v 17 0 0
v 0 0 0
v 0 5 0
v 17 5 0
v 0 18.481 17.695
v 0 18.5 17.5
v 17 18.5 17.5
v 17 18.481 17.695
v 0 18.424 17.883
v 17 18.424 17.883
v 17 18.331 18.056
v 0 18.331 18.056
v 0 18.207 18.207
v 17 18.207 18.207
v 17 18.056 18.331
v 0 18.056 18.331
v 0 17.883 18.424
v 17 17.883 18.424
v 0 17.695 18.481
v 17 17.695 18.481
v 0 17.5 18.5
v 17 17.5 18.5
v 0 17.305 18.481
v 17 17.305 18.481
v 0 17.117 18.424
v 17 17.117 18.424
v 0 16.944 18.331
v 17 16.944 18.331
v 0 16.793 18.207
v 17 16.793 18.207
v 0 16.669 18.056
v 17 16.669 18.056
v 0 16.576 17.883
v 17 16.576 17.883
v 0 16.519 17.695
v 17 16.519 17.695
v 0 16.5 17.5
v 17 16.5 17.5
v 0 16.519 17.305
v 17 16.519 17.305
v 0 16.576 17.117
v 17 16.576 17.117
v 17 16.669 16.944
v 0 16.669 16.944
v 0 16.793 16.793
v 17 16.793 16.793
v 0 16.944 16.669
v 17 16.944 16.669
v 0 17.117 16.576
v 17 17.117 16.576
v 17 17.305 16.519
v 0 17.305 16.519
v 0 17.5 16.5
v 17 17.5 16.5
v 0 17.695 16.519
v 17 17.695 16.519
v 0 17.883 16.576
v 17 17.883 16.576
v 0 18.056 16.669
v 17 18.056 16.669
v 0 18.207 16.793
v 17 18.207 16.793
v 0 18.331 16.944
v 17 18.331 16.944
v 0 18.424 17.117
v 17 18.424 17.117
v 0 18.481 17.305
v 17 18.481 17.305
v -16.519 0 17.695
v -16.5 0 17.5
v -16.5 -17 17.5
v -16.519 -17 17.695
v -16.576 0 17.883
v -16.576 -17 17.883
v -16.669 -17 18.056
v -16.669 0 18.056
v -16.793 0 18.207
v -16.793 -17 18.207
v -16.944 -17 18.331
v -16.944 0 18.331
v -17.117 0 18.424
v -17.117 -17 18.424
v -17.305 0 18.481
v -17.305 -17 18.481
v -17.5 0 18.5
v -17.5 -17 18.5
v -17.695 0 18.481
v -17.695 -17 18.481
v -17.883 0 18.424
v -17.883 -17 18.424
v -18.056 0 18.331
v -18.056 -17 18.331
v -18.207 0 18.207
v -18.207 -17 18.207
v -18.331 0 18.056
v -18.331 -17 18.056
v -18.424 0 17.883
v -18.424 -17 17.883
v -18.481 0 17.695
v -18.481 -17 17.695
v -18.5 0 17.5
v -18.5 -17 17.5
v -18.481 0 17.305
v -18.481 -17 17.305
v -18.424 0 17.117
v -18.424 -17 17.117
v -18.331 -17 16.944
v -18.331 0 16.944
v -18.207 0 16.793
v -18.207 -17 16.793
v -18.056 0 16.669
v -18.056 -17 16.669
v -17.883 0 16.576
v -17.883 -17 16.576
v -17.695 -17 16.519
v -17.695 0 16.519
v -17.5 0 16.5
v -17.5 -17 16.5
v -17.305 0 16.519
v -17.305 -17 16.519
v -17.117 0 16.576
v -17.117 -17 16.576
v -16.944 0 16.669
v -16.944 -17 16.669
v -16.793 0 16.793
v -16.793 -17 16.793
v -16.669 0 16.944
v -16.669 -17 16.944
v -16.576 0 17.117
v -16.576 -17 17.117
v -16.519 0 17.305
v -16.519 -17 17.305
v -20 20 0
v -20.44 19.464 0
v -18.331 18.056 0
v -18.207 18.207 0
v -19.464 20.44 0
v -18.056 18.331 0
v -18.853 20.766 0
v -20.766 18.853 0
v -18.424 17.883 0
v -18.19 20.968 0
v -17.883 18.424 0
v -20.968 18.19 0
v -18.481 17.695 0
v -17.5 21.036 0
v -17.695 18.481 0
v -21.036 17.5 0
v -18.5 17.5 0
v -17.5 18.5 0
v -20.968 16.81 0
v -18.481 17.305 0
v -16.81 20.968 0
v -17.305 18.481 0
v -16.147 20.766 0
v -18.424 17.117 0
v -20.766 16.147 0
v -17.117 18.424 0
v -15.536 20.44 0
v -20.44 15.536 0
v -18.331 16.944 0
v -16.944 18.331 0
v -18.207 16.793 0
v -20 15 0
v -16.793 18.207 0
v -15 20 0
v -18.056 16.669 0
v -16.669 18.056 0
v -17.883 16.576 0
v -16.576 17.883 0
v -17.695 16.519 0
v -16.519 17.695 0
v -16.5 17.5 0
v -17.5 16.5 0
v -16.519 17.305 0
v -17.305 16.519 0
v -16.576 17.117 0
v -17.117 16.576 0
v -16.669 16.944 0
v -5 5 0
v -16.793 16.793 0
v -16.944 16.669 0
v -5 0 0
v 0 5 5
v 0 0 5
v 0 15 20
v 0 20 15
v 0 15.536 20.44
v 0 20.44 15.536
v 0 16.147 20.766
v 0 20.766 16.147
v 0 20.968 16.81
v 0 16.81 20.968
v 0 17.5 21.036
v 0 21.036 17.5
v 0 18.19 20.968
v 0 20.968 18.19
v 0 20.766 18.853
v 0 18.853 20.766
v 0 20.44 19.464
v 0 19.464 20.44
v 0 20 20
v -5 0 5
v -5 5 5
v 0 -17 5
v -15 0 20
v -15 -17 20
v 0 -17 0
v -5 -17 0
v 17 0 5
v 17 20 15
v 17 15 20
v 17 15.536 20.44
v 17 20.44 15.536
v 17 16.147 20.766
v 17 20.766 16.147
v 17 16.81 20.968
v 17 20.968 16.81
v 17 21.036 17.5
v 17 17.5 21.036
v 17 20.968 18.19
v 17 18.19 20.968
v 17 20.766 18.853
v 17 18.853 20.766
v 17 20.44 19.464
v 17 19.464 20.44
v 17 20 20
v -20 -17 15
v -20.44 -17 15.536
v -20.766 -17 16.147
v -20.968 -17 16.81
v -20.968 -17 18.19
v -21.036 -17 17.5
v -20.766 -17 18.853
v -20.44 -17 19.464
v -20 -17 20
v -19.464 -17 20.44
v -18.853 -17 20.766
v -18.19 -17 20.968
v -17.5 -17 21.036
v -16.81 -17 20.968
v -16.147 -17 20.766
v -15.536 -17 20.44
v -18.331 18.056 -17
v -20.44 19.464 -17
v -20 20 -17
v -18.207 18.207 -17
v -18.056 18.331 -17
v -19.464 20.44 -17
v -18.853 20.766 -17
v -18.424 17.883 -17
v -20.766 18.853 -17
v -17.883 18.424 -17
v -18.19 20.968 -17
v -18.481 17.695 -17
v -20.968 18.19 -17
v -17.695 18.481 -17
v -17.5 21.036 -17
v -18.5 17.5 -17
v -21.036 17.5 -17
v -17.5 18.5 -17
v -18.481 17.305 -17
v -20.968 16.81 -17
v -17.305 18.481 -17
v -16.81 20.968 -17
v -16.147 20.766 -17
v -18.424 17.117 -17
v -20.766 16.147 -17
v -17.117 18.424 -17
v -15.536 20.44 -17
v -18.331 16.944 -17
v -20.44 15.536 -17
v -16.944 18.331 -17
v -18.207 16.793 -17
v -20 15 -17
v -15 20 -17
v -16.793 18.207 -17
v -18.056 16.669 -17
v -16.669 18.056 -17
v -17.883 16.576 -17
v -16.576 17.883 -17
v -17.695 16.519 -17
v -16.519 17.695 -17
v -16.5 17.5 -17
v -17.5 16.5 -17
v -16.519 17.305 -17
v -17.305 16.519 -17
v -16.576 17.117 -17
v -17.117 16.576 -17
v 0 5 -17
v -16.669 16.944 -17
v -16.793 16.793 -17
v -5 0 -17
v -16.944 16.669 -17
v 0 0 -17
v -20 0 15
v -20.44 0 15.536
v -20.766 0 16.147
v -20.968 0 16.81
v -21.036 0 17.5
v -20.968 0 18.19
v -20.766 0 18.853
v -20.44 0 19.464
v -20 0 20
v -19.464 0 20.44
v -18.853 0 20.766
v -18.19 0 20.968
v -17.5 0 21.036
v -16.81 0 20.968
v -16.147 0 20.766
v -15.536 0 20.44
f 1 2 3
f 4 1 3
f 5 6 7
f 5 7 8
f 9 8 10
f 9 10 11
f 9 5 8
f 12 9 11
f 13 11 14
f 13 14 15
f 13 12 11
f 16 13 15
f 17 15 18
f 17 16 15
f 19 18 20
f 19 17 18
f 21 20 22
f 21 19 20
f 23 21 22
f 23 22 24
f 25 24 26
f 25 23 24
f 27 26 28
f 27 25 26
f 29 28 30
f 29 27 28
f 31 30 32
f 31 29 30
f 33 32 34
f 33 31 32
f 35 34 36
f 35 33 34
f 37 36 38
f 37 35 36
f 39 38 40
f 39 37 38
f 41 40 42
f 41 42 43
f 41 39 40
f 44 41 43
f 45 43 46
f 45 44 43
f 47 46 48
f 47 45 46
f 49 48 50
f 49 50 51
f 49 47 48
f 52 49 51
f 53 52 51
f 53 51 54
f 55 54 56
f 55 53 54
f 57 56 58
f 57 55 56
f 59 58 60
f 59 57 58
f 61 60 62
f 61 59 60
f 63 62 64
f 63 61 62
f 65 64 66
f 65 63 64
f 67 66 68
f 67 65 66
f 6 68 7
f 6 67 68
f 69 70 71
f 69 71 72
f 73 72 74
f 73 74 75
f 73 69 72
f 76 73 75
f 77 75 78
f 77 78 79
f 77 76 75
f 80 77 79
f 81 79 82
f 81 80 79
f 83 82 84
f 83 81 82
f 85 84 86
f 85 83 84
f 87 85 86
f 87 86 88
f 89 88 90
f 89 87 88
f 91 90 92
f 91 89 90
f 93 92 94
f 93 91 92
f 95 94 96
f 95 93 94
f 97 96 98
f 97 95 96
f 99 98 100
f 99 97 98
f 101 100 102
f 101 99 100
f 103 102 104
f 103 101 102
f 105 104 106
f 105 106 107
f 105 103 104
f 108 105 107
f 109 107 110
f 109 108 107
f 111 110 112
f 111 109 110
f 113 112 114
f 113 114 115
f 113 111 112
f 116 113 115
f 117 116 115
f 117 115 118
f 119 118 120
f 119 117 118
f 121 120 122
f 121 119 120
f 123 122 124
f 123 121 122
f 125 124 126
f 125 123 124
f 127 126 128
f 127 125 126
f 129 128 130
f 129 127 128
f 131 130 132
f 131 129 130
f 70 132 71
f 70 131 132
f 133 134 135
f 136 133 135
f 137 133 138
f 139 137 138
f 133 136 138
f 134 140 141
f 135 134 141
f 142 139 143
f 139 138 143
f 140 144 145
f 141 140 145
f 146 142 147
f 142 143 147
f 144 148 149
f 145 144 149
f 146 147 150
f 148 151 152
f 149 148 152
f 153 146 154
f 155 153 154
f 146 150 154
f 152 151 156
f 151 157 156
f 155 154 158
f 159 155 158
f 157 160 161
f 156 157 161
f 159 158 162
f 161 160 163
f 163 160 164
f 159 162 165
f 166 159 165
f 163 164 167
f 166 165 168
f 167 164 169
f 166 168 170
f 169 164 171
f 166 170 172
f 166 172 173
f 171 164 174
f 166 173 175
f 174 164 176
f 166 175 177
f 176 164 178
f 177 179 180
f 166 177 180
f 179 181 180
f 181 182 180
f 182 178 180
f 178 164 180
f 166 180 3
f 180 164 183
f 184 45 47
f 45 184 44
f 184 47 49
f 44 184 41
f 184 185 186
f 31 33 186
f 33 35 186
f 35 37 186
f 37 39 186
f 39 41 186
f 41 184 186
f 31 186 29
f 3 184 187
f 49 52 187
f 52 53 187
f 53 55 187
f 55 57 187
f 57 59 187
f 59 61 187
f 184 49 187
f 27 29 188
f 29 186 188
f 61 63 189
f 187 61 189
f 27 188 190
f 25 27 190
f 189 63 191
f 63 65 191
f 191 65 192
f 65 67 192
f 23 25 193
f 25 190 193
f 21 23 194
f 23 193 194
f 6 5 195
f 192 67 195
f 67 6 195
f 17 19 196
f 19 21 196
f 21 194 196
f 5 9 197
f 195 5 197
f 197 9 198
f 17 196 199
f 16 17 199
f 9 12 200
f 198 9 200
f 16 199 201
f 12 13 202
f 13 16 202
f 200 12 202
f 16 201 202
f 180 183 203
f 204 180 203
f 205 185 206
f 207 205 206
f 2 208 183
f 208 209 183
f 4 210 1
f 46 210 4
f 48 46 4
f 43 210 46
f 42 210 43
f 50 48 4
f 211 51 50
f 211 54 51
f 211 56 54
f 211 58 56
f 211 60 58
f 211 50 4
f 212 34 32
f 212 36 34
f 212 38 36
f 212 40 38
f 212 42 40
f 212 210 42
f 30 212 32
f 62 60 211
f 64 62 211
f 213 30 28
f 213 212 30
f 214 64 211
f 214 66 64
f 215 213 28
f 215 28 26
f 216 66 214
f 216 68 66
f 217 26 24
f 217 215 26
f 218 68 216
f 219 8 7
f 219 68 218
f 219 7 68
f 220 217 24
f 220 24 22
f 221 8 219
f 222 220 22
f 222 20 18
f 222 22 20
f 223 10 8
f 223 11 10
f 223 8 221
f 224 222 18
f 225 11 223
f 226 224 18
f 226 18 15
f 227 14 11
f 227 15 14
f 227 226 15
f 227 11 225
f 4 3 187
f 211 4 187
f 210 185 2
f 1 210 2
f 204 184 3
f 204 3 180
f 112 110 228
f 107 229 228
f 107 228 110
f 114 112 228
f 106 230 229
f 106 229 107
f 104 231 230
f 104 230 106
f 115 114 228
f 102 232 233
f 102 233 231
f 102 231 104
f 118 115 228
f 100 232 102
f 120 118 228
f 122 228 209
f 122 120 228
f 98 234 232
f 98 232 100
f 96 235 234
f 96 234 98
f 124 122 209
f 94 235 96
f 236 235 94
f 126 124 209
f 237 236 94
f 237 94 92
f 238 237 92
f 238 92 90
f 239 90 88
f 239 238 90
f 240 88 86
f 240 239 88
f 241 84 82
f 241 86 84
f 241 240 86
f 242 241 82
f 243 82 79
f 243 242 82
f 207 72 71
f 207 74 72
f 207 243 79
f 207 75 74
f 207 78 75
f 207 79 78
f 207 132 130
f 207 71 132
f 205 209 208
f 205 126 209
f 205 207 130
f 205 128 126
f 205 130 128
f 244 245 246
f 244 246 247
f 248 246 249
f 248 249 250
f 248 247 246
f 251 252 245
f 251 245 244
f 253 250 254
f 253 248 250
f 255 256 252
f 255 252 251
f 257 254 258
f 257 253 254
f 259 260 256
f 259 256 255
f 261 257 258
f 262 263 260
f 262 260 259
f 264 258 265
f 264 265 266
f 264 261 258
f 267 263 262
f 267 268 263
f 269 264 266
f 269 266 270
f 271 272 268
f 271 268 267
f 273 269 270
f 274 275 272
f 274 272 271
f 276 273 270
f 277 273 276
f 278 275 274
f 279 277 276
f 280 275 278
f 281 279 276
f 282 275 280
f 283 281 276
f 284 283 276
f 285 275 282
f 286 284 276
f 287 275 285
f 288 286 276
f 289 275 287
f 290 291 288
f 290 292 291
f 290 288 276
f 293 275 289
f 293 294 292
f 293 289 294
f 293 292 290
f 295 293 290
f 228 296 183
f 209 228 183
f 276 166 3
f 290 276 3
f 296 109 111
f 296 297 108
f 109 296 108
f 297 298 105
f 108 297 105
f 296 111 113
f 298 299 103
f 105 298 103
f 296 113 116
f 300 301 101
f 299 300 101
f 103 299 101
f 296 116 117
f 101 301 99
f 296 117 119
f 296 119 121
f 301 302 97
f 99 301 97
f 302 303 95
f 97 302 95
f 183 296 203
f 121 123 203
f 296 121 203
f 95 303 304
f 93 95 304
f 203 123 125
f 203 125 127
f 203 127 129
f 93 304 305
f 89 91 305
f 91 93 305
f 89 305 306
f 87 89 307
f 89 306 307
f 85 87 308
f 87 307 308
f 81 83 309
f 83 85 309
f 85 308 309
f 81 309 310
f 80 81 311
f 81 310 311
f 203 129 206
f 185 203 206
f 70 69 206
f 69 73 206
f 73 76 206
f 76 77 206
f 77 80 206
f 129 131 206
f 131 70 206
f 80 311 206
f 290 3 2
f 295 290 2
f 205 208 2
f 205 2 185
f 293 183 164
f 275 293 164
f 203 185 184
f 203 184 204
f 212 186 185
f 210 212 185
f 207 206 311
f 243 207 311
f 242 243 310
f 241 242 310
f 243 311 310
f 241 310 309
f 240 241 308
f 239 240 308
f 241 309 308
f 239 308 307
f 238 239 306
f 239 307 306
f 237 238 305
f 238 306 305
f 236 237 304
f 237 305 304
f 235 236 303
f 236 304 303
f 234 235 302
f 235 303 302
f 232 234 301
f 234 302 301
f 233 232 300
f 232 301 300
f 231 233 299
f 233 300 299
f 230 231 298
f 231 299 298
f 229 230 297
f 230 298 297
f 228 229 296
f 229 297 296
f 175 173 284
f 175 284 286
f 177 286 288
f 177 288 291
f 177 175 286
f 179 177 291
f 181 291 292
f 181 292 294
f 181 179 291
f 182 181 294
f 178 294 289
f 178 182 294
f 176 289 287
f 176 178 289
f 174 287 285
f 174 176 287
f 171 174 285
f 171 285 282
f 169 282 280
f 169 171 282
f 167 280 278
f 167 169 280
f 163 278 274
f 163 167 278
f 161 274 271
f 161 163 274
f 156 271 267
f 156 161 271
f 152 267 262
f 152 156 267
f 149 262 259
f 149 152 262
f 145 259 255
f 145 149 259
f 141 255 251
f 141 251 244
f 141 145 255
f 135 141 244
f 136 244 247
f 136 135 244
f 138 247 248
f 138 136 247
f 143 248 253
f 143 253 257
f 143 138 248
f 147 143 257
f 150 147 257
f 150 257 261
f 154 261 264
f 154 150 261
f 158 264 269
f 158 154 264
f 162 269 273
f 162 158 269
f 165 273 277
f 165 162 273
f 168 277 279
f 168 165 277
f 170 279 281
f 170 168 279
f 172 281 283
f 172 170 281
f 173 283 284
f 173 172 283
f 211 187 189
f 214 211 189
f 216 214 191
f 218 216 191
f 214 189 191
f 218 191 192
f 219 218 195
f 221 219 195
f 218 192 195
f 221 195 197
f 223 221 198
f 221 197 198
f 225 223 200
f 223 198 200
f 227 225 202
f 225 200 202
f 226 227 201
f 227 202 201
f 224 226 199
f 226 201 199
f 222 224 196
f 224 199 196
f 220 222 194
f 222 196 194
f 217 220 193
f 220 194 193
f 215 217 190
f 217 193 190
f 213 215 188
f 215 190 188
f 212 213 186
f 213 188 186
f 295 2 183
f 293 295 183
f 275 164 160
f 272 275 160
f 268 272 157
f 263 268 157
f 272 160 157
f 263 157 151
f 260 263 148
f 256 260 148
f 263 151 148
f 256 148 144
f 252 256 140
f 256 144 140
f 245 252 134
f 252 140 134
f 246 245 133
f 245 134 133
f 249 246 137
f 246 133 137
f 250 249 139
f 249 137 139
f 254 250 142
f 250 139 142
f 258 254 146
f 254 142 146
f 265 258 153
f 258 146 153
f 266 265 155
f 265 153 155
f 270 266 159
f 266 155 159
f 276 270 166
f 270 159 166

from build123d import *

# Parameters (mm, degrees)
F0_R     = 1
F1_DEPTH = 17
F2_W     = 5
F2_H     = 5
F3_DEPTH = 5
F4_R     = 1
F5_DEPTH = 17
F6_R     = 1
F7_DEPTH = 17


with BuildPart() as f1:
    # F0 (on Front) → F1 (new body)
    with BuildSketch(Plane.XZ):
        with BuildLine():
            Line((-5, 0), (0, 0))
            Line((0, 0), (0, 5))
            Line((0, 5), (-15, 20))
            ThreePointArc((-15, 20), (-20, 20), (-20, 15))
            Line((-20, 15), (-5, 0))
        make_face()
        with Locations((-17.5, 17.5)):
            Circle(F0_R, mode=Mode.SUBTRACT)
    extrude(amount=F1_DEPTH)

    # F2 (on face) → F3 (join)
    with BuildSketch(Plane(origin=(0, 0, 0), x_dir=(-1, 0, 0), z_dir=(0, 1, 0))):
        with Locations((2.5, 2.5)):
            Rectangle(F2_W, F2_H)
    extrude(amount=F3_DEPTH)

    # F4 (on face) → F5 (join)
    with BuildSketch(Plane.YZ):
        with BuildLine():
            Line((0, 5), (0, 0))
            Line((0, 0), (5, 0))
            Line((5, 0), (20, 15))
            ThreePointArc((20, 15), (20, 20), (15, 20))
            Line((15, 20), (0, 5))
        make_face()
        with Locations((17.5, 17.5)):
            Circle(F4_R, mode=Mode.SUBTRACT)
    extrude(amount=F5_DEPTH)

    # F6 (on face) → F7 (join)
    with BuildSketch(Plane(origin=(0, 0, 0), x_dir=(1, 0, 0), z_dir=(0, 0, -1))):
        with BuildLine():
            Line((0, -5), (0, 0))
            Line((0, 0), (-5, 0))
            Line((-5, 0), (-20, -15))
            ThreePointArc((-20, -15), (-20, -20), (-15, -20))
            Line((-15, -20), (0, -5))
        make_face()
        with Locations((-17.5, -17.5)):
            Circle(F6_R, mode=Mode.SUBTRACT)
    extrude(amount=F7_DEPTH)


solid = f1.part
